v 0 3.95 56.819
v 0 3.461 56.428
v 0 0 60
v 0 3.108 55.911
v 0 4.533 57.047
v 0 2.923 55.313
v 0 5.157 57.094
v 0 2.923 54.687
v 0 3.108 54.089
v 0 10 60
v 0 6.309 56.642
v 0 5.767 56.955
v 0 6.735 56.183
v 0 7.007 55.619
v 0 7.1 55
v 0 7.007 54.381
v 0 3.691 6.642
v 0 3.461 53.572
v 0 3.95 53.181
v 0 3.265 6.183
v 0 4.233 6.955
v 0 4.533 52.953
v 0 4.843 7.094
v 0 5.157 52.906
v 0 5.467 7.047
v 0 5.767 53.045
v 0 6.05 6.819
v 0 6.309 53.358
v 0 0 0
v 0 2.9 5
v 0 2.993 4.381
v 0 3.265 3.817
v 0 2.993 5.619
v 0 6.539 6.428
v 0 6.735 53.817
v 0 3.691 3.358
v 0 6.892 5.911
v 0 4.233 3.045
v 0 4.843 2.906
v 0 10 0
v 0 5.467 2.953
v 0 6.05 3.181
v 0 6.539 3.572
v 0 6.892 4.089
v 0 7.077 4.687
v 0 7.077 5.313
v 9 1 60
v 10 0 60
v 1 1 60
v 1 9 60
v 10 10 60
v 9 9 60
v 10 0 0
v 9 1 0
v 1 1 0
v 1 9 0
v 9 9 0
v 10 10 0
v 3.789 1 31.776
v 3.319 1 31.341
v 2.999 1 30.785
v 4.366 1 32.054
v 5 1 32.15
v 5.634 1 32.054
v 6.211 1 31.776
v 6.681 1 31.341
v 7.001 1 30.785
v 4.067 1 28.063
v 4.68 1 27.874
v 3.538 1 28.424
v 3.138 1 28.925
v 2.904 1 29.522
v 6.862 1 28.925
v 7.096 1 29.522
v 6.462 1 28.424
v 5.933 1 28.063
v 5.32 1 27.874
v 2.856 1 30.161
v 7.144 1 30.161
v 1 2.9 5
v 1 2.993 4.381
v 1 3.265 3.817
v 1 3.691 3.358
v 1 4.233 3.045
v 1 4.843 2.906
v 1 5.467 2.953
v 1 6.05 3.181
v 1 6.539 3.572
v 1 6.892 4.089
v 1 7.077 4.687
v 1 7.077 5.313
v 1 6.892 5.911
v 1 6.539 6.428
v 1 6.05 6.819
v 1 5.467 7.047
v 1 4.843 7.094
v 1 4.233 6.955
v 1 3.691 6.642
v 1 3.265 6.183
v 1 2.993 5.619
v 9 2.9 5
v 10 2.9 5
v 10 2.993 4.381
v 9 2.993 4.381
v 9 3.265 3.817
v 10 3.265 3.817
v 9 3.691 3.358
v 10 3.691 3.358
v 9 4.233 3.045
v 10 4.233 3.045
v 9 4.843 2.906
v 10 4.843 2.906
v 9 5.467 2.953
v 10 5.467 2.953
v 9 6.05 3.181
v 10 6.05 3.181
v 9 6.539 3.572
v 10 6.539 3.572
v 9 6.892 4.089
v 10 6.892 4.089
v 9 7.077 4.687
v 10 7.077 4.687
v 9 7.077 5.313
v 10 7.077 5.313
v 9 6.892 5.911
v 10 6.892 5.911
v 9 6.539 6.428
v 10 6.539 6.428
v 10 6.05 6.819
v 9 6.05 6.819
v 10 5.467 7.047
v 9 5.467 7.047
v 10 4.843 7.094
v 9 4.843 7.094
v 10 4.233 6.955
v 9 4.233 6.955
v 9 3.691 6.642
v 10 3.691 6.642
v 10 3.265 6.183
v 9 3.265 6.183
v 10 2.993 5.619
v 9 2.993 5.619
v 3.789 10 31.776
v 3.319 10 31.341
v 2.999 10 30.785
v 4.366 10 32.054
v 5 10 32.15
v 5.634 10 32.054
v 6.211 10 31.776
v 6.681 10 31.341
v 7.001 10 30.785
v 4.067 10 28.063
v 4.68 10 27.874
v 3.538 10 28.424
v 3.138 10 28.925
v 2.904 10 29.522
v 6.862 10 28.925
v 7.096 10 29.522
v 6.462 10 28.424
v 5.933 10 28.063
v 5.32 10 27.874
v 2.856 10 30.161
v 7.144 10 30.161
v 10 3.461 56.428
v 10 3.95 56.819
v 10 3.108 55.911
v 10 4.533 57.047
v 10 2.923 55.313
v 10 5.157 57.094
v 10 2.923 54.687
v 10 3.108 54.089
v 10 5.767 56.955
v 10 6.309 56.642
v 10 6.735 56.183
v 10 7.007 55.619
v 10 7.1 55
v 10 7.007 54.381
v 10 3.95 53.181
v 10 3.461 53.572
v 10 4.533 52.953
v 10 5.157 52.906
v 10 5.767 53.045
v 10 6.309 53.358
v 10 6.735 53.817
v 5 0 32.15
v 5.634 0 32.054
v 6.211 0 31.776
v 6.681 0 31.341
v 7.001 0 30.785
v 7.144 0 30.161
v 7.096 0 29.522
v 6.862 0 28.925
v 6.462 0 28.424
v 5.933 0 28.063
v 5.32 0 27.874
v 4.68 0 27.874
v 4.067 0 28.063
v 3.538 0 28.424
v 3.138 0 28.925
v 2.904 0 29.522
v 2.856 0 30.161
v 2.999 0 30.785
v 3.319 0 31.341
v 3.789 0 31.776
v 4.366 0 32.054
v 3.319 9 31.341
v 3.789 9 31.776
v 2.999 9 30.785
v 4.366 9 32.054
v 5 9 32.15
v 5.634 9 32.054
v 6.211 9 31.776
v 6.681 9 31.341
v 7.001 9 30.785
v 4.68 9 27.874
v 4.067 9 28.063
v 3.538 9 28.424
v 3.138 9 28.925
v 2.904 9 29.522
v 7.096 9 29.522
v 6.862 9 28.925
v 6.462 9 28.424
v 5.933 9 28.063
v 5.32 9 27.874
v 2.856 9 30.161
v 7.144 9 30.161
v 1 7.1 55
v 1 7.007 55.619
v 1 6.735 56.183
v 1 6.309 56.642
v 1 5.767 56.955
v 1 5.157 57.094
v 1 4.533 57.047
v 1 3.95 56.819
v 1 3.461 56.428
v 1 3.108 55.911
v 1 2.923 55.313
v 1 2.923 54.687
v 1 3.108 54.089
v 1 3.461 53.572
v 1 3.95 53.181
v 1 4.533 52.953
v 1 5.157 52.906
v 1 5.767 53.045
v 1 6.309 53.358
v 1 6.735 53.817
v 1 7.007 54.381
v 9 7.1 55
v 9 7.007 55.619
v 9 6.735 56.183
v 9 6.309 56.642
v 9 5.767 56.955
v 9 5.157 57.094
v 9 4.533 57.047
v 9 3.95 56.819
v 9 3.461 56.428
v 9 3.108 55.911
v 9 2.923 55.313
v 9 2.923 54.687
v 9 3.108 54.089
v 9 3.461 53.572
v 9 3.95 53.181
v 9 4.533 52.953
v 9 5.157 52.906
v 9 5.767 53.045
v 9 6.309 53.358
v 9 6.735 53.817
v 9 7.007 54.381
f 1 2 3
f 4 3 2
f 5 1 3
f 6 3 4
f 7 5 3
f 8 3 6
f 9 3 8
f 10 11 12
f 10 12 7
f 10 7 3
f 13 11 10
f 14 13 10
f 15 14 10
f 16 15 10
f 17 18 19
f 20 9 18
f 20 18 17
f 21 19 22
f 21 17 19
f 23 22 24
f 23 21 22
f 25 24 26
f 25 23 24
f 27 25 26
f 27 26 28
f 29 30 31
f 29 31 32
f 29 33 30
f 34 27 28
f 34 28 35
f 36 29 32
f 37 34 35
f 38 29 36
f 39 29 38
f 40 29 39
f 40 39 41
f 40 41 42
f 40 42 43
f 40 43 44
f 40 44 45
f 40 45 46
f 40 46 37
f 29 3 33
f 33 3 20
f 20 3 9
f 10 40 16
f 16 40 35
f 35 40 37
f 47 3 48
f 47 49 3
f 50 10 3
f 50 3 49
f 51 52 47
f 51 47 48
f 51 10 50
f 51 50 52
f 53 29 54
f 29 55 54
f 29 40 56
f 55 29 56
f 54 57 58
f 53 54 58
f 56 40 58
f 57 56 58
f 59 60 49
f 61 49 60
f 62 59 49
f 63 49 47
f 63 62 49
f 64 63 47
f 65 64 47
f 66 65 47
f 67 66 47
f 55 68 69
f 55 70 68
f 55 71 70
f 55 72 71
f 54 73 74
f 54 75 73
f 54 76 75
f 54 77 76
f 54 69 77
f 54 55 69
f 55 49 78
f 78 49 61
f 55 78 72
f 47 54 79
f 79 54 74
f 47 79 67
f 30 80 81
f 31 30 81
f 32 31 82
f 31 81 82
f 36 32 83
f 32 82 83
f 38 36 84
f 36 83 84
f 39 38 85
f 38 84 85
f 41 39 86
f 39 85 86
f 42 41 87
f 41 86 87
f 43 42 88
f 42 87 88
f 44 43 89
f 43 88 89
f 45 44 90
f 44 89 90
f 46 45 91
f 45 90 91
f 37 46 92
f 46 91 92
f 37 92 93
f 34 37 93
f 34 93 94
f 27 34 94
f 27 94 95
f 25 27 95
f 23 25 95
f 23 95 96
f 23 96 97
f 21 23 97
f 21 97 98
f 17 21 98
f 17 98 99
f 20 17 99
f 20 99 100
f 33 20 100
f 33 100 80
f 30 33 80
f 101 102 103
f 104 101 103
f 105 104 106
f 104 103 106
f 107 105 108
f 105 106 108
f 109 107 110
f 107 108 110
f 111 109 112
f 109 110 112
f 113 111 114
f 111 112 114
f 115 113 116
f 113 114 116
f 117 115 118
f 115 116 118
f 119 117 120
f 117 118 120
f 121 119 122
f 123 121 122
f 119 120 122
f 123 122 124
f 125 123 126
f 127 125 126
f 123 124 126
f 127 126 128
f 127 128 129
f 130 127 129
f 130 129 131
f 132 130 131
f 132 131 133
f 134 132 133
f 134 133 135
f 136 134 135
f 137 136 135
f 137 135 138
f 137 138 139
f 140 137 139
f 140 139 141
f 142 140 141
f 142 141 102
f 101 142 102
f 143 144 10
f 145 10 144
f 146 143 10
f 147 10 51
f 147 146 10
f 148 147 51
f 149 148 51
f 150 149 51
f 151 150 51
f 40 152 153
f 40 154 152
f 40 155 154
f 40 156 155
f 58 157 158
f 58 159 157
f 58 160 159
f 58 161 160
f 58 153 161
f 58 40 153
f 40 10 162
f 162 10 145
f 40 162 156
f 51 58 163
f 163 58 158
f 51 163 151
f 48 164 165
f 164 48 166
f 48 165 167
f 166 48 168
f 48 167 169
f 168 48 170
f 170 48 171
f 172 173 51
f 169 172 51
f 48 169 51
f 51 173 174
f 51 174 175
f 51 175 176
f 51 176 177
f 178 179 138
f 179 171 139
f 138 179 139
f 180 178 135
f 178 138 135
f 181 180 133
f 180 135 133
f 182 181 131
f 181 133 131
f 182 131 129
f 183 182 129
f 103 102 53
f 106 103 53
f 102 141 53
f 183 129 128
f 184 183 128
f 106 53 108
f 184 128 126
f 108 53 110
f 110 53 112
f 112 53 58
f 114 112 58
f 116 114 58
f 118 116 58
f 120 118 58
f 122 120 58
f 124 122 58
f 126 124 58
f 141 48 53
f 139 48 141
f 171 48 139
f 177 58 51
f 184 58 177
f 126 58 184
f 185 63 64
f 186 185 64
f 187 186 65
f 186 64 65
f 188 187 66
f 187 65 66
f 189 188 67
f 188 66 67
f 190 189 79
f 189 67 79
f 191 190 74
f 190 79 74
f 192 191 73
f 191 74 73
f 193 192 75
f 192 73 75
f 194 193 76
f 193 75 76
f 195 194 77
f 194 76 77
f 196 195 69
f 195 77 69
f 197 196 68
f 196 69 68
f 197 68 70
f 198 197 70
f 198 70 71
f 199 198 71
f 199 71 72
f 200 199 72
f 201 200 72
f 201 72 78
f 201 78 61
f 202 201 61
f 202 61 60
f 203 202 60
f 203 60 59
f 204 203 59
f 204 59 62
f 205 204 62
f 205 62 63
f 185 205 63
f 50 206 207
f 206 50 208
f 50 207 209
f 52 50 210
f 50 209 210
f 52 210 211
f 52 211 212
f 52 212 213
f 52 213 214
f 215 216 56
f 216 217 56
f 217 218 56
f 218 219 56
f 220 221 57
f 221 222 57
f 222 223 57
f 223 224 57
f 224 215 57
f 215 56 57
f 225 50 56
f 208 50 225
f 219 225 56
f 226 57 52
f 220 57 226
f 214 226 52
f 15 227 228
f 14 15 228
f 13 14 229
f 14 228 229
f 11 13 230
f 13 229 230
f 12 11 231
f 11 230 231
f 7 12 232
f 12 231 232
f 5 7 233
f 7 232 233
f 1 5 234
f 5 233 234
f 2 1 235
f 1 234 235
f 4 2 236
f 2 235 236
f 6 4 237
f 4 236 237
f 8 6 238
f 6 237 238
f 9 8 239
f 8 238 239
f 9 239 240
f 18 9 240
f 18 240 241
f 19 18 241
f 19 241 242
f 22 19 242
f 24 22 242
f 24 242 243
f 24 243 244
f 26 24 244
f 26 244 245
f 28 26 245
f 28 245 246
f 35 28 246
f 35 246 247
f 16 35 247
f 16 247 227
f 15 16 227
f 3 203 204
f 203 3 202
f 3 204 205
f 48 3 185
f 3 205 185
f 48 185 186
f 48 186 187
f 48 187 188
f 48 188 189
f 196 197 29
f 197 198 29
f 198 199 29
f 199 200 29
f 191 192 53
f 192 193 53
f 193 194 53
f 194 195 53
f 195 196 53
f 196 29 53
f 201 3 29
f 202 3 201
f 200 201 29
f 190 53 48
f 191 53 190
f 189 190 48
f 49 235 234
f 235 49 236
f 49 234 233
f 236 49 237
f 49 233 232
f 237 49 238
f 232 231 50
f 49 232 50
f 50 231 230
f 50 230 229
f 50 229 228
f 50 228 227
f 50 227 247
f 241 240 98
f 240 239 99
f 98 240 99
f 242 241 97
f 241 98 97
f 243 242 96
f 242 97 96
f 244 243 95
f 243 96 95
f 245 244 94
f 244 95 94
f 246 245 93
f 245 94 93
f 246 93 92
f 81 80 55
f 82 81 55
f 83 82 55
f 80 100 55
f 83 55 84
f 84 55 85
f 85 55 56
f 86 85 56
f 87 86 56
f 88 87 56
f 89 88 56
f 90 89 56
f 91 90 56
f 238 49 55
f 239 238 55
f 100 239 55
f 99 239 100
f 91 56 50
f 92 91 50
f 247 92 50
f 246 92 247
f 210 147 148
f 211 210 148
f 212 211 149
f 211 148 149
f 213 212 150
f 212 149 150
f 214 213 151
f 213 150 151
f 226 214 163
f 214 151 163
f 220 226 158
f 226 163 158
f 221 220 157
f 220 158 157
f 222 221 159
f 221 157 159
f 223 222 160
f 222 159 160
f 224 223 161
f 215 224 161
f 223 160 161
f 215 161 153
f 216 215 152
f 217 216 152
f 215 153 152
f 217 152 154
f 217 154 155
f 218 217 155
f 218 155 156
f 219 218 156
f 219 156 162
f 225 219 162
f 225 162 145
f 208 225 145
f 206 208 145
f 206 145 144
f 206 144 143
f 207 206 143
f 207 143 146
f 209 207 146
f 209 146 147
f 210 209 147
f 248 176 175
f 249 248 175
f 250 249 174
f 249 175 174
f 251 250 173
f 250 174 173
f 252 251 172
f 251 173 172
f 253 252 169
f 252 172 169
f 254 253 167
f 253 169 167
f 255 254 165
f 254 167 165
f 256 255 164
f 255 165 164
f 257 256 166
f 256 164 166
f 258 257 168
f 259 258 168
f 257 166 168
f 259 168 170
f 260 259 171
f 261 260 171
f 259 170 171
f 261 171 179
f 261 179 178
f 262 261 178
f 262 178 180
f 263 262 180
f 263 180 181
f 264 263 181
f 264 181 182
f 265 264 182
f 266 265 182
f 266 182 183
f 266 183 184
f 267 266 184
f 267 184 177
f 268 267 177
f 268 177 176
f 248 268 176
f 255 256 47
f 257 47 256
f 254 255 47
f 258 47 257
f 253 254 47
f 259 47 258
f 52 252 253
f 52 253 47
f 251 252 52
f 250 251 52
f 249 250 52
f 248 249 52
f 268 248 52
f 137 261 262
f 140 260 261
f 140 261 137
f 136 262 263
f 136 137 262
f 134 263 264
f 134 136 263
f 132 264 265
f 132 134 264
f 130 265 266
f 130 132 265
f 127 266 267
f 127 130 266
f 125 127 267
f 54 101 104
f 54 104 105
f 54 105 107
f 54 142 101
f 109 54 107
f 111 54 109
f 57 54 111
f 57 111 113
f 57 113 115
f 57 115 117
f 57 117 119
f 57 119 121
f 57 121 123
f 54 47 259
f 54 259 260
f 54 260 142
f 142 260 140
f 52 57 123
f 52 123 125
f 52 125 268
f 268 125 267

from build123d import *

# Parameters (mm, degrees)
SKETCH_1_W          = 10
SKETCH_1_H          = 10
SKETCH_1_W_2        = 8
SKETCH_1_H_2        = 8
EXTRUDE_1_DEPTH     = 60
CUT_EXTRUDE_1_REACH = 63.644
SKETCH_2_R          = 2.1
CUT_EXTRUDE_2_REACH = 63.644
SKETCH_3_R          = 2.15


with BuildPart() as part:
    # ｽｹｯﾁ1 → 押し出し-薄板1 (new body)
    with BuildSketch(Plane.XY):
        with Locations((5, 5)):
            Rectangle(SKETCH_1_W, SKETCH_1_H)
        with Locations((5, 5)):
            Rectangle(SKETCH_1_W_2, SKETCH_1_H_2, mode=Mode.SUBTRACT)
    extrude(amount=EXTRUDE_1_DEPTH)

    # ｶｯﾄ - 押し出し1: up to this face of the body (flat: up to its plane)
    cut_extrude_1_end = Plane(part.part.faces().sort_by_distance((0, 5, 30))[0])
    # ｽｹｯﾁ2 → ｶｯﾄ - 押し出し1 (cut, up to the picked face)
    with BuildSketch(Plane(origin=(10, 0, 0), x_dir=(0, 0, -1), z_dir=(1, 0, 0)), mode=Mode.PRIVATE) as cut_extrude_1_sk1:
        with Locations(Location((-55, 5, 0), (0, 0, 90))):
            Circle(SKETCH_2_R)
    cut_extrude_1_tool1 = split(extrude(cut_extrude_1_sk1.sketch, amount=-CUT_EXTRUDE_1_REACH, mode=Mode.PRIVATE), bisect_by=cut_extrude_1_end, keep=Keep.BOTH, mode=Mode.PRIVATE)
    # ｽｹｯﾁ2 → ｶｯﾄ - 押し出し1 (cut, up to the picked face)
    with BuildSketch(Plane(origin=(10, 0, 0), x_dir=(0, 0, -1), z_dir=(1, 0, 0)), mode=Mode.PRIVATE) as cut_extrude_1_sk2:
        with Locations(Location((-5, 5, 0), (0, 0, 270))):
            Circle(SKETCH_2_R)
    cut_extrude_1_tool2 = split(extrude(cut_extrude_1_sk2.sketch, amount=-CUT_EXTRUDE_1_REACH, mode=Mode.PRIVATE), bisect_by=cut_extrude_1_end, keep=Keep.BOTH, mode=Mode.PRIVATE)
    add(cut_extrude_1_tool1.solids().sort_by(Axis((10, 5, 55), (-1, 0, 0)))[0], mode=Mode.SUBTRACT)
    add(cut_extrude_1_tool2.solids().sort_by(Axis((10, 5, 5), (-1, 0, 0)))[0], mode=Mode.SUBTRACT)

    # ｶｯﾄ - 押し出し2: up to this face of the body (flat: up to its plane)
    cut_extrude_2_end = Plane(part.part.faces().sort_by_distance((5, 0, 30))[0])
    # ｽｹｯﾁ3 → ｶｯﾄ - 押し出し2 (cut, up to the picked face)
    with BuildSketch(Plane(origin=(0, 10, 0), x_dir=(1, 0, 0), z_dir=(0, 1, 0)), mode=Mode.PRIVATE) as cut_extrude_2_sk1:
        with Locations(Location((5, -30, 0), (0, 0, 270))):
            Circle(SKETCH_3_R)
    cut_extrude_2_tool1 = split(extrude(cut_extrude_2_sk1.sketch, amount=-CUT_EXTRUDE_2_REACH, mode=Mode.PRIVATE), bisect_by=cut_extrude_2_end, keep=Keep.BOTH, mode=Mode.PRIVATE)
    add(cut_extrude_2_tool1.solids().sort_by(Axis((5, 10, 30), (0, -1, 0)))[0], mode=Mode.SUBTRACT)


solid = part.part
